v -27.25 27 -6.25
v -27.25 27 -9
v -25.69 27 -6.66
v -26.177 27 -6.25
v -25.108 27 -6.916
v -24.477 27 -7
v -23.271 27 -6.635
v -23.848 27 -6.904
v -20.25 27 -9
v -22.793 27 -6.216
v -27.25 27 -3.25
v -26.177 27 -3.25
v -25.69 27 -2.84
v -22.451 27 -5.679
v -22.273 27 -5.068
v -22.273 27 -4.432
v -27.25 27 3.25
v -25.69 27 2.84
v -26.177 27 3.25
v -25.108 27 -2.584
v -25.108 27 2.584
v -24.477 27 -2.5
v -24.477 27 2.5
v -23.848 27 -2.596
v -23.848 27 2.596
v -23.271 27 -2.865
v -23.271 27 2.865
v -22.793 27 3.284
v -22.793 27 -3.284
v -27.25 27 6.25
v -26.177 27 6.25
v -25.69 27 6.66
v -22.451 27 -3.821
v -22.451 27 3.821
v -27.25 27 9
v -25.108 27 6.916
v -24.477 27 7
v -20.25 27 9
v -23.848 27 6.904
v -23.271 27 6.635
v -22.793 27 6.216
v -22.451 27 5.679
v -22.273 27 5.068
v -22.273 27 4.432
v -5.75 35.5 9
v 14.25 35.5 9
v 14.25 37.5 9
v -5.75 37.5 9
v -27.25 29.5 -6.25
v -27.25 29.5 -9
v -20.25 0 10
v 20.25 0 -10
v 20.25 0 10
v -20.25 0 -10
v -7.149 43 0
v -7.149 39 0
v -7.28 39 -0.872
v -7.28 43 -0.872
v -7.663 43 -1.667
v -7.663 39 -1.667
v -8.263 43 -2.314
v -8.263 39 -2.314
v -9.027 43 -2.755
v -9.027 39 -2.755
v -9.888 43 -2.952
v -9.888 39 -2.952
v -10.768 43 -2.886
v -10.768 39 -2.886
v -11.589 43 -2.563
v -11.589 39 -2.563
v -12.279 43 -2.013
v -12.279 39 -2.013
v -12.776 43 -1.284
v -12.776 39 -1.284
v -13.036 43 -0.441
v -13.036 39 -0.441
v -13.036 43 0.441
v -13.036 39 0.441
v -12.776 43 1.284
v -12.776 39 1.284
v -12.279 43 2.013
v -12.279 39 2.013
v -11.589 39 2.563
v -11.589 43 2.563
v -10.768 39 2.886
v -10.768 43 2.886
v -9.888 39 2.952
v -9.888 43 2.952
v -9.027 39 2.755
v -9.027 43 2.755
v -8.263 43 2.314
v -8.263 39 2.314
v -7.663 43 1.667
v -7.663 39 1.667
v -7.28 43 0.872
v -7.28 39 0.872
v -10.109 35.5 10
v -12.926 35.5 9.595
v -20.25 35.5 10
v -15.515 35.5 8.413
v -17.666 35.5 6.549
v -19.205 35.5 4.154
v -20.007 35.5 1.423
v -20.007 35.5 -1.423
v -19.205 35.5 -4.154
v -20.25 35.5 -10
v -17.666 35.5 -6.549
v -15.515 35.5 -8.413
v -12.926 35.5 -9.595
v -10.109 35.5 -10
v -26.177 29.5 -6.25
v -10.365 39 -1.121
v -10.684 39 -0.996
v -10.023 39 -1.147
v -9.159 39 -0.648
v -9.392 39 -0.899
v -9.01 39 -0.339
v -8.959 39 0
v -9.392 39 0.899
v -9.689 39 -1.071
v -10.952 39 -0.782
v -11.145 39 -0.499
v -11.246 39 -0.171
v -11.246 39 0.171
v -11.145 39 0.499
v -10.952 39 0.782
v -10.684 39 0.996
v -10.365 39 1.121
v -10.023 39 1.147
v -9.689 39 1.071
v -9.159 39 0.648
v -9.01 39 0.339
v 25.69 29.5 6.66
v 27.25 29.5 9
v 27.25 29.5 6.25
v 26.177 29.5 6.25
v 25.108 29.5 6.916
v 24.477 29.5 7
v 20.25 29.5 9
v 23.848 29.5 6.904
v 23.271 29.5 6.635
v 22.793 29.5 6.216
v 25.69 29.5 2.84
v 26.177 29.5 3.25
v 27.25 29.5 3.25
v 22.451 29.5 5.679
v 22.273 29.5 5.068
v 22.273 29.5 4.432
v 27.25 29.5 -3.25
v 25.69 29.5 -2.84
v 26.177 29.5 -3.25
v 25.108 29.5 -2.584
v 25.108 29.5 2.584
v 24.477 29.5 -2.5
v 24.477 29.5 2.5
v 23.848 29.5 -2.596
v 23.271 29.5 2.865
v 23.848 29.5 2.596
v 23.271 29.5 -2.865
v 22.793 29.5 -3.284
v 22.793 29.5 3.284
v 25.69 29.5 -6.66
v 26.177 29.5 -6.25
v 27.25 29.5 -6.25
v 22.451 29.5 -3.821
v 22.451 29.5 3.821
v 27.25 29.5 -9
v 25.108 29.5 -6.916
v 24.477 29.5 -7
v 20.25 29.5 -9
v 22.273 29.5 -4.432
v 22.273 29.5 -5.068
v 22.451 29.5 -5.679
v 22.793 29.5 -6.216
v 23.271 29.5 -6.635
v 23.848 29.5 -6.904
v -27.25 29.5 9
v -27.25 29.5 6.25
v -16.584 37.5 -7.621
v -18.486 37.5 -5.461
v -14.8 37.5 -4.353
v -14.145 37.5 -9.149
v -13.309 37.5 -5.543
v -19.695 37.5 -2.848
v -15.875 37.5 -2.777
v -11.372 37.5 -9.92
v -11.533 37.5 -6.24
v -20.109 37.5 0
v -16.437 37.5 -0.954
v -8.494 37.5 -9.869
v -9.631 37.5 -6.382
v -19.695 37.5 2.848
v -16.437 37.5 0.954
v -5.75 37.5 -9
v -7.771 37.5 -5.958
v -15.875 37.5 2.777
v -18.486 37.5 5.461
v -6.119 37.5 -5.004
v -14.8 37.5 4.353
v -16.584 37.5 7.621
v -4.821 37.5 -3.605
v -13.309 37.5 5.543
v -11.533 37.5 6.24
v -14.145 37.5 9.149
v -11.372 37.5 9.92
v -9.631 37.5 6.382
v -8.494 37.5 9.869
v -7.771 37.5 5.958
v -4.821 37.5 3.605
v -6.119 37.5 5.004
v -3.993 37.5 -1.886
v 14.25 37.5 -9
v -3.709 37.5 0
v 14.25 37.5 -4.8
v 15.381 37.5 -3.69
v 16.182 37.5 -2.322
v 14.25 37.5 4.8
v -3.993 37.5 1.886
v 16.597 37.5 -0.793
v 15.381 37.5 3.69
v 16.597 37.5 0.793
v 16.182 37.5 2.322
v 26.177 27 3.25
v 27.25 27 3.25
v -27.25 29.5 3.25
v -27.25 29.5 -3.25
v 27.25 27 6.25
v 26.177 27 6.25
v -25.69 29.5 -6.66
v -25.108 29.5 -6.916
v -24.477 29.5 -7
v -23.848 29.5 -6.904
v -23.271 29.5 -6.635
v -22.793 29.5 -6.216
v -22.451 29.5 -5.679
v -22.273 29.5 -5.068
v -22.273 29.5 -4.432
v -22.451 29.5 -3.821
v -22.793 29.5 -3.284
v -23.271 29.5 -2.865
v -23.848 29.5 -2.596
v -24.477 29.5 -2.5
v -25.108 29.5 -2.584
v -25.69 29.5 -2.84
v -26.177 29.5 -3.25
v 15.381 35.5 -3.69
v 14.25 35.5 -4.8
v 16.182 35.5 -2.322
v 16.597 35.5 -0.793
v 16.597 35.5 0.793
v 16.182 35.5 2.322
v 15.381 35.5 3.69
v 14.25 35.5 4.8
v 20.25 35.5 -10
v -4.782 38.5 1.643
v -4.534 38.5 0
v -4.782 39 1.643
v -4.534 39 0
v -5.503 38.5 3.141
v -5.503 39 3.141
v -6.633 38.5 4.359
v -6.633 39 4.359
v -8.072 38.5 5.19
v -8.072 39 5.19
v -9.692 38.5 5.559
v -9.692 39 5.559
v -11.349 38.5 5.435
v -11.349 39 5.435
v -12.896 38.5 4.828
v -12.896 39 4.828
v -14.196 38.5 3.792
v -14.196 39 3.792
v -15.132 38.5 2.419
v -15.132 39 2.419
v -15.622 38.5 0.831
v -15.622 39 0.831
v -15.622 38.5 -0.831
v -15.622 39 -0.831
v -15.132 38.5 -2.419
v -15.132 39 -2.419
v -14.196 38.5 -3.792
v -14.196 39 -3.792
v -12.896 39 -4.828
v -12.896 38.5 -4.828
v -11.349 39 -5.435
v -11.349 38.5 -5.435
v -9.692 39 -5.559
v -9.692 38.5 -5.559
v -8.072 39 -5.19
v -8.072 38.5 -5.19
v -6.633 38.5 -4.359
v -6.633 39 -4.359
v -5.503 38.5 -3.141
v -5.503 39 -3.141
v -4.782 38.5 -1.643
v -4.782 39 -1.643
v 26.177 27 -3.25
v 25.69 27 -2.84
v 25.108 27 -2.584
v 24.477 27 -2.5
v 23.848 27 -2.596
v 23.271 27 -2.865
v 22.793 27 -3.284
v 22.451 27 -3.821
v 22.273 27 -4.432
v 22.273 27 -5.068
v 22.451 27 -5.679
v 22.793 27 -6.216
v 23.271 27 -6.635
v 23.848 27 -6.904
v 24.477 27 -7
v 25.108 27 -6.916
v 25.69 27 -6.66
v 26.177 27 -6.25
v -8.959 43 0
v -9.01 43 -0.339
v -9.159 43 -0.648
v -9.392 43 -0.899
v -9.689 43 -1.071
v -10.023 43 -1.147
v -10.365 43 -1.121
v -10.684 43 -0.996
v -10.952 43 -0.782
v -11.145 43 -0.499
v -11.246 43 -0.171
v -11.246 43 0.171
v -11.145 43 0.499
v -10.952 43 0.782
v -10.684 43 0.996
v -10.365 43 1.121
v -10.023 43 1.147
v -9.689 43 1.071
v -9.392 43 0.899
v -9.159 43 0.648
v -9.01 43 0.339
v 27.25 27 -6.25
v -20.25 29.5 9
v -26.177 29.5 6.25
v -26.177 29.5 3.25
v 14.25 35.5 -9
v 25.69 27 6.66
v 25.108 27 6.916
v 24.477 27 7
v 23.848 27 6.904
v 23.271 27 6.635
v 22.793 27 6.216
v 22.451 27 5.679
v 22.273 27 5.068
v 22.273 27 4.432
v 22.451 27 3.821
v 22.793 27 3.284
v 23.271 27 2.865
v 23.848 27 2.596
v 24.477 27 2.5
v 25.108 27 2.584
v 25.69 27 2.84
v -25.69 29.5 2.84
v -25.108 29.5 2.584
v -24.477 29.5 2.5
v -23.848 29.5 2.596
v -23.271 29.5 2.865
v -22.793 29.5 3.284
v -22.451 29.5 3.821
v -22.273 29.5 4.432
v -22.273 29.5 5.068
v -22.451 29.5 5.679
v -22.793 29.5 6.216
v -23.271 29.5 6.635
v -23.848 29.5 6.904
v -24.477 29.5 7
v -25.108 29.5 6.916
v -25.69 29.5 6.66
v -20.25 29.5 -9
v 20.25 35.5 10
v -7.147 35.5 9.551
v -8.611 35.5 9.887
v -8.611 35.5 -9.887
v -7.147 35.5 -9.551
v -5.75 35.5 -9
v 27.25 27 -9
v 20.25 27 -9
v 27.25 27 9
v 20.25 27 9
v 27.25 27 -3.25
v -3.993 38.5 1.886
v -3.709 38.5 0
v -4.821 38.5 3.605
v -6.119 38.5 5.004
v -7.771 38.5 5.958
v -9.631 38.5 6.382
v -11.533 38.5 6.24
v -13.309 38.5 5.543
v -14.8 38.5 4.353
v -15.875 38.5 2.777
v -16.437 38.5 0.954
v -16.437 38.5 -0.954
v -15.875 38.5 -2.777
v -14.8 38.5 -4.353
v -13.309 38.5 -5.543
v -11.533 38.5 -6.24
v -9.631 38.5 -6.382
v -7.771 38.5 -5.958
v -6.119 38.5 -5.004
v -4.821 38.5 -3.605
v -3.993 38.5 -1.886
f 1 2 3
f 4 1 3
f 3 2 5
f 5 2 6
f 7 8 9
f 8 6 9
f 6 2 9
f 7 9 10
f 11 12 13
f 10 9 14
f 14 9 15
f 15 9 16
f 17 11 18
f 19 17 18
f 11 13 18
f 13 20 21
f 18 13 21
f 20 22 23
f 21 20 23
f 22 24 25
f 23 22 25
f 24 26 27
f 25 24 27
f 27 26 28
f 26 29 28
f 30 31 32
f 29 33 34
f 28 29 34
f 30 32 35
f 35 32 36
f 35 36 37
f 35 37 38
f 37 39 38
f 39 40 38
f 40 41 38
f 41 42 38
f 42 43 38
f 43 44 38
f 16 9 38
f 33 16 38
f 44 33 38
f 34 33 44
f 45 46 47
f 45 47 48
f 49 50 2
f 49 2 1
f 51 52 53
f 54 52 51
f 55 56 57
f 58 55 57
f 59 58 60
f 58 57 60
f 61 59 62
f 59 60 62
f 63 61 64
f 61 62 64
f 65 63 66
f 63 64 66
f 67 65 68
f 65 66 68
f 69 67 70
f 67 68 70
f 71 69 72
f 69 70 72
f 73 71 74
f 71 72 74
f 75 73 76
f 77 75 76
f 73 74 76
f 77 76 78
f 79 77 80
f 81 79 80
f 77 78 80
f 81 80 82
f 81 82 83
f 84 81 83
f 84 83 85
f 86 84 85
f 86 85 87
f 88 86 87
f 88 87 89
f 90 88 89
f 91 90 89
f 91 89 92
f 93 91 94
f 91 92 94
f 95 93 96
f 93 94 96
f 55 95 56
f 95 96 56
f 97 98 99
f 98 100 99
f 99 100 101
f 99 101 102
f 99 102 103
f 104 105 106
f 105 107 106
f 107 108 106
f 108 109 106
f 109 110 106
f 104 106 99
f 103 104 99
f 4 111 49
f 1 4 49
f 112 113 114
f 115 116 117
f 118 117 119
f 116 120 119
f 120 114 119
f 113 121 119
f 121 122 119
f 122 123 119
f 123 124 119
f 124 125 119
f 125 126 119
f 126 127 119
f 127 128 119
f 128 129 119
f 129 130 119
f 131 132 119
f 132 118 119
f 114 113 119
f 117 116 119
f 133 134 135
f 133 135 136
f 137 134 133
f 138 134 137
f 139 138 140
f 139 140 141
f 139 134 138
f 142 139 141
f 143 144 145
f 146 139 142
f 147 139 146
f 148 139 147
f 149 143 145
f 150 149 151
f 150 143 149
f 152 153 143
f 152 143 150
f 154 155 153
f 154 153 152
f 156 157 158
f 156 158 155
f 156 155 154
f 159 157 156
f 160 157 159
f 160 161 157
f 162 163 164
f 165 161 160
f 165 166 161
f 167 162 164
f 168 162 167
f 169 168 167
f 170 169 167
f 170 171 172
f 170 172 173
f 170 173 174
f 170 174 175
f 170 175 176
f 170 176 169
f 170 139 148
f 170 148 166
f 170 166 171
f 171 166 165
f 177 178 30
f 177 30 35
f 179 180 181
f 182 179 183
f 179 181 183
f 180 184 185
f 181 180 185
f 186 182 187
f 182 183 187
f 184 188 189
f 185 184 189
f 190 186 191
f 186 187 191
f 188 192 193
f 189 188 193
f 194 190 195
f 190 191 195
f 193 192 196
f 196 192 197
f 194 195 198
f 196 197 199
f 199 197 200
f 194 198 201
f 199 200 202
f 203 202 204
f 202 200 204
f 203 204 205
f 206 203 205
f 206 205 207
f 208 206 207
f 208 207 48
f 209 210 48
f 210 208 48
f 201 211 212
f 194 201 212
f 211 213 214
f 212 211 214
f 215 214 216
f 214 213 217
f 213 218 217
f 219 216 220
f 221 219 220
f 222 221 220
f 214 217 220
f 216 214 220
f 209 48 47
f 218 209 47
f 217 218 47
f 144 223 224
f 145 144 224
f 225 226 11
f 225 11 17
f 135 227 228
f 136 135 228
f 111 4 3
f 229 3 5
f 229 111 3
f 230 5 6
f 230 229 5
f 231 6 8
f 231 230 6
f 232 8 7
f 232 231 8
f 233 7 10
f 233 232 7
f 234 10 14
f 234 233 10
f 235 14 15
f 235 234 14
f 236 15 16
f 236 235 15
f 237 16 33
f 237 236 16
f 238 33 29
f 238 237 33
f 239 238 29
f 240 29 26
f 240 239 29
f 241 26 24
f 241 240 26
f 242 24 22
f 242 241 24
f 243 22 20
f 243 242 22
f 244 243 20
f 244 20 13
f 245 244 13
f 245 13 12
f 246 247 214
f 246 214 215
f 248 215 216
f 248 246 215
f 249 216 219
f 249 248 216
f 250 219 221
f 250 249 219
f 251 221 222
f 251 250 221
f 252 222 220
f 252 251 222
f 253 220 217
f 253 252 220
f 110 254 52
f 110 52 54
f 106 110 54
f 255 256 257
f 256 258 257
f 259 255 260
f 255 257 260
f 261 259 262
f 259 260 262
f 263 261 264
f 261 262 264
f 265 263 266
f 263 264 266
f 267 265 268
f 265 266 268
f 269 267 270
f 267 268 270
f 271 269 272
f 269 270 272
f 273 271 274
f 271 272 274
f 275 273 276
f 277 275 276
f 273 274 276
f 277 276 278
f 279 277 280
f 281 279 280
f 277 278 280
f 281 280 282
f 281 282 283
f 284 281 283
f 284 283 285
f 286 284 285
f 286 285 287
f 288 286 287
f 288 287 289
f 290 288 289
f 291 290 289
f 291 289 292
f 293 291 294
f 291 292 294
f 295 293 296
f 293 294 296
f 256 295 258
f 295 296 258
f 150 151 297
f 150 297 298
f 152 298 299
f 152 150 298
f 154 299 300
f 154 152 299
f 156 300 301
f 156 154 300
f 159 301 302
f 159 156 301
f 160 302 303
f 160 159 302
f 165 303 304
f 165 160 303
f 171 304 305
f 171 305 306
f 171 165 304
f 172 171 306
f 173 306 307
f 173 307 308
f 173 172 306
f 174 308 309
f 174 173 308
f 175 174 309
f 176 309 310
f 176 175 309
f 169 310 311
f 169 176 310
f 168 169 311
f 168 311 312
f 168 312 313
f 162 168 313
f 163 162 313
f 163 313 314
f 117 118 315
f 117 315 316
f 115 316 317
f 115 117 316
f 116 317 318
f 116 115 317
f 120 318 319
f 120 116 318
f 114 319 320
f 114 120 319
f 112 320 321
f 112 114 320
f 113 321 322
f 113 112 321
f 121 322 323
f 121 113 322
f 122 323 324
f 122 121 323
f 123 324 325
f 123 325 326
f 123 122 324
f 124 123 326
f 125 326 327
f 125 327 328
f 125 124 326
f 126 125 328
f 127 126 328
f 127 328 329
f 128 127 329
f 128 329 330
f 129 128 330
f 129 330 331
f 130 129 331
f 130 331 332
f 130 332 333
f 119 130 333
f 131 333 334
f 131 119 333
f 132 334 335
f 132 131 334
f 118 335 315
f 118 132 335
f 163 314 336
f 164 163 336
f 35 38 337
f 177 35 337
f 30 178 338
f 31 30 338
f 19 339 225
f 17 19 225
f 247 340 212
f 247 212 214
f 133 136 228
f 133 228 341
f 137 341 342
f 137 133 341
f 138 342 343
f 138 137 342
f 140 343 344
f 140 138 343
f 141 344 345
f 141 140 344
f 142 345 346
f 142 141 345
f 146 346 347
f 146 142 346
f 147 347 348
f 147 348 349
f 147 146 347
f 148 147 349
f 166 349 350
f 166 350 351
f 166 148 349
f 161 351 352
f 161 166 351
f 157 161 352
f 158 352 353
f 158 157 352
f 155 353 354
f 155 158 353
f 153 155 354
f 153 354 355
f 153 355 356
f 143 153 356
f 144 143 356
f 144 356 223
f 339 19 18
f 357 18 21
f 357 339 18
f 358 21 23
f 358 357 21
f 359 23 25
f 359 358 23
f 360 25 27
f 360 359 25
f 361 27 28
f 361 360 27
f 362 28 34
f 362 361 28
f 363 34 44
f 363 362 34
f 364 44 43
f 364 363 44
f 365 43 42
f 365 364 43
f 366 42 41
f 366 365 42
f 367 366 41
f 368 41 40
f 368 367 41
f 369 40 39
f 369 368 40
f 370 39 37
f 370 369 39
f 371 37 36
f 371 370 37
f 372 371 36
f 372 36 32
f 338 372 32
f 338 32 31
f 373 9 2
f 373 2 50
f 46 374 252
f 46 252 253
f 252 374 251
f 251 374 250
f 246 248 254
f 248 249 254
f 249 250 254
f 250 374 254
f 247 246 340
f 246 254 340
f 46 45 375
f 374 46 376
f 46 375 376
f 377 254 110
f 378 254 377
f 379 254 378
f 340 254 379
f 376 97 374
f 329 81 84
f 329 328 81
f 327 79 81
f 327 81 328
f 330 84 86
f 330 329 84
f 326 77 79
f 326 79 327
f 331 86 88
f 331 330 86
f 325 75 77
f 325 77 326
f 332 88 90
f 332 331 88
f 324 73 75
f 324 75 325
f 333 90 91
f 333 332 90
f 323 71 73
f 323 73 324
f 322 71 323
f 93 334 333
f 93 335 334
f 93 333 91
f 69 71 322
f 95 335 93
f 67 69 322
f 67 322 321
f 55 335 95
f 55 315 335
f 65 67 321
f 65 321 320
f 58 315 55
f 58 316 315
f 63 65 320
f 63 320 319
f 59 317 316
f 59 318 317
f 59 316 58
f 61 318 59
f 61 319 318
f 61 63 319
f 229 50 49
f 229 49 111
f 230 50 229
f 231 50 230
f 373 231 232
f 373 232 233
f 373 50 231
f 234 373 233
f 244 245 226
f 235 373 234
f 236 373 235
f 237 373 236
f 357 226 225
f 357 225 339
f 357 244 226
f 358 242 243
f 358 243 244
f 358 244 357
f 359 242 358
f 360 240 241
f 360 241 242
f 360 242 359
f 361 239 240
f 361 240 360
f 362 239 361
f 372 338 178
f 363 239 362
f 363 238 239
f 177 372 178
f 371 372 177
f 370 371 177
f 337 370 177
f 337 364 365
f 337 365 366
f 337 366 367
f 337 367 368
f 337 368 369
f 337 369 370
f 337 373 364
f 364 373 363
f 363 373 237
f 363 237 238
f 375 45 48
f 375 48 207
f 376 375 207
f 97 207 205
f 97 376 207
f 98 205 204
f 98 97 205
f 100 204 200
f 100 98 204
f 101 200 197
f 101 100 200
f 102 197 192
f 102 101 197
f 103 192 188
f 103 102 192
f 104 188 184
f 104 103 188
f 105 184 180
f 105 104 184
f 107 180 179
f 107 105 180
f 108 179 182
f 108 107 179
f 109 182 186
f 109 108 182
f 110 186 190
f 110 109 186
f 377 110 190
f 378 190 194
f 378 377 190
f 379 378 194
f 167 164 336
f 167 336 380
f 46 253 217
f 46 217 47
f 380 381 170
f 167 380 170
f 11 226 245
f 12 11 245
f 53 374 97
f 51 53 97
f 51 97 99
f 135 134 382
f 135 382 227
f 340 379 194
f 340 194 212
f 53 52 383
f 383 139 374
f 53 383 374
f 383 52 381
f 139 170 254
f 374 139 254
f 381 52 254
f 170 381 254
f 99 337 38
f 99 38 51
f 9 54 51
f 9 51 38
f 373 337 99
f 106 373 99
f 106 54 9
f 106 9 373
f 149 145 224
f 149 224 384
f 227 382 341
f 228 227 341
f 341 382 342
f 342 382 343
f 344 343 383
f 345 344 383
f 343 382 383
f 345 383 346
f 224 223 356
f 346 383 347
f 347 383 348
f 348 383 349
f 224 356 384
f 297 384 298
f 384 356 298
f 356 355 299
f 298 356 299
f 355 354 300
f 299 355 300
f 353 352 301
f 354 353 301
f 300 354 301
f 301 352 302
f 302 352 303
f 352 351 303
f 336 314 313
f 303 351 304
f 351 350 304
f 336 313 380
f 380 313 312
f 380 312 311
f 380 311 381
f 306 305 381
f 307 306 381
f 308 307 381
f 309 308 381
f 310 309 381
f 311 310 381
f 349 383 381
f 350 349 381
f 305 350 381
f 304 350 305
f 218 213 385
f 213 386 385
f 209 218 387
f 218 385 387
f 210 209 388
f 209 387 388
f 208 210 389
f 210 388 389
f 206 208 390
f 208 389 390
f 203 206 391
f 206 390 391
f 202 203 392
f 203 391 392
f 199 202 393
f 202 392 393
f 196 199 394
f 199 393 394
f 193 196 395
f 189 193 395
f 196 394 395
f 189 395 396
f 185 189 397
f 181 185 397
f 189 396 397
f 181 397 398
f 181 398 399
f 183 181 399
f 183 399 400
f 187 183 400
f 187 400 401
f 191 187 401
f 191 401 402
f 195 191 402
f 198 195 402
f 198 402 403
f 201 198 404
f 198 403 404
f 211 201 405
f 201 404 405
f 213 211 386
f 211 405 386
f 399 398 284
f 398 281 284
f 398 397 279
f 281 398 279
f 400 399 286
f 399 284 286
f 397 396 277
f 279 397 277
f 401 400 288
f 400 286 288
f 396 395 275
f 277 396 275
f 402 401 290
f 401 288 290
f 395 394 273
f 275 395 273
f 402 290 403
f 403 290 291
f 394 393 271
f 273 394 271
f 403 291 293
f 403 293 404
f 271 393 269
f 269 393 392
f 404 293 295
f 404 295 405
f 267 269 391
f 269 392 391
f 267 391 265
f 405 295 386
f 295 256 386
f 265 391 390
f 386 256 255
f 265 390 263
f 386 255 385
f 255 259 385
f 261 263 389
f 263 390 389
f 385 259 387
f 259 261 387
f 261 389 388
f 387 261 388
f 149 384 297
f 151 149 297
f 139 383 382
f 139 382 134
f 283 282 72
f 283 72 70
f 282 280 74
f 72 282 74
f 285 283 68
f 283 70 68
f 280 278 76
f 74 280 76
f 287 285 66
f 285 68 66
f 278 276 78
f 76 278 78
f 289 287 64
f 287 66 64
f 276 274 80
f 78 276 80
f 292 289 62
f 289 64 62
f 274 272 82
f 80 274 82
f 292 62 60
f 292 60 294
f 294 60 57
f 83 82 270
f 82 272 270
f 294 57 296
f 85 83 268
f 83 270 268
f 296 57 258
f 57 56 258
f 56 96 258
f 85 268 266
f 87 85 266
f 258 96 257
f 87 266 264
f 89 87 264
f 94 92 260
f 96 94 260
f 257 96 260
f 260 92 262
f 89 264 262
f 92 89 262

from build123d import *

# Parameters (mm, degrees)
ESBO_O1_W                = 40.5
ESBO_O1_H                = 35.5
RESSALTO_EXTRUS_O1_DEPTH = 20
RESSALTO_EXTRUS_O2_DEPTH = 2
ESBO_O3_W                = 18
ESBO_O3_H                = 2.499999999
RESSALTO_EXTRUS_O3_DEPTH = 7
CORTE_EXTRUS_O1_DEPTH    = 11.500000003
CORTE_EXTRUS_O2_DEPTH    = 11.500000003
RESSALTO_EXTRUS_O4_DEPTH = 2
ESBO_O7_W                = 18
ESBO_O7_H                = 2.499999994
RESSALTO_EXTRUS_O5_DEPTH = 7
CORTE_EXTRUS_O3_DEPTH    = 30.499999991
CORTE_EXTRUS_O4_DEPTH    = 30.499999991
ESBO_O10_W               = 2.25
ESBO_O10_H               = 2.5
ESBO_O11_W               = 2.25
ESBO_O11_H               = 2.5
ESBO_O12_W               = 2.25
ESBO_O12_H               = 2.5
ESBO_O13_W               = 2.25
ESBO_O13_H               = 2.5
ESBO_O15_R               = 2.96
ESBO_O15_R_2             = 1.15
RESSALTO_EXTRUS_O6_DEPTH = 4


with BuildPart() as part:
    # Esboço1 → Ressalto-extrusão1 (new body)
    with BuildSketch(Plane(origin=(0, 0, -10), x_dir=(-1, 0, 0), z_dir=(0, 0, -1))):
        with Locations((0, 17.75)):
            Rectangle(ESBO_O1_W, ESBO_O1_H)
    extrude(amount=-RESSALTO_EXTRUS_O1_DEPTH)

    # Esboço2 → Ressalto-extrusão2 (add)
    with BuildSketch(Plane(origin=(0, 35.5, 0), x_dir=(-1, 0, 0), z_dir=(0, 1, 0))):
        with BuildLine():
            Line((-14.25, 9), (5.75, 9))
            ThreePointArc((5.75, 9), (20.108898944, -1e-09), (5.75, -9))
            Line((5.75, -9), (-14.25, -9))
            Line((-14.25, -9), (-14.25, 9))
        make_face()
    extrude(amount=RESSALTO_EXTRUS_O2_DEPTH)

    # Esboço3 → Ressalto-extrusão3 (add)
    with BuildSketch(Plane(origin=(20.25, 0, 0), x_dir=(0, 0, -1), z_dir=(1, 0, 0))):
        with Locations((0, 28.249999997)):
            Rectangle(ESBO_O3_W, ESBO_O3_H)
    extrude(amount=RESSALTO_EXTRUS_O3_DEPTH)

    # Esboço4 → Corte-extrusão1 (cut, through all)
    with BuildSketch(Plane.XZ.offset(-26.999999997)):
        with BuildLine():
            Line((27.25, 3.25), (27.25, 6.25))
            Line((27.25, 6.25), (26.177050983, 6.25))
            ThreePointArc((26.177050983, 6.25), (26.75, 4.75), (26.177050983, 3.25))
            Line((26.177050983, 3.25), (27.25, 3.25))
        make_face()
    extrude(amount=-CORTE_EXTRUS_O1_DEPTH, mode=Mode.SUBTRACT)

    # Esboço5 → Corte-extrusão2 (cut, through all)
    with BuildSketch(Plane.XZ.offset(-26.999999997)):
        with BuildLine():
            Line((27.25, -6.25), (27.25, -3.25))
            Line((27.25, -3.25), (26.177050983, -3.25))
            ThreePointArc((26.177050983, -3.25), (26.75, -4.75), (26.177050983, -6.25))
            Line((26.177050983, -6.25), (27.25, -6.25))
        make_face()
    extrude(amount=-CORTE_EXTRUS_O2_DEPTH, mode=Mode.SUBTRACT)

    # Esboço6 → Ressalto-extrusão4 (add)
    with BuildSketch(Plane(origin=(0, 35.5, 0), x_dir=(-1, 0, 0), z_dir=(0, 1, 0))):
        with BuildLine():
            Line((-14.249999993, 4.8), (-14.249999993, -4.800000003))
            ThreePointArc((-14.249999993, -4.800000003), (-16.649999996, -1e-09), (-14.249999993, 4.8))
        make_face()
    extrude(amount=RESSALTO_EXTRUS_O4_DEPTH)

    # Esboço7 → Ressalto-extrusão5 (add)
    with BuildSketch(Plane.ZY.offset(20.25)):
        with Locations((0, 28.249999994)):
            Rectangle(ESBO_O7_W, ESBO_O7_H)
    extrude(amount=RESSALTO_EXTRUS_O5_DEPTH)

    # Esboço8 → Corte-extrusão3 (cut, through all)
    with BuildSketch(Plane(origin=(0, 29.499999991, 0), x_dir=(-1, 0, 0), z_dir=(0, 1, 0))):
        with BuildLine():
            Line((27.25, 6.25), (26.177050983, 6.25))
            ThreePointArc((26.177050983, 6.25), (26.75, 4.75), (26.177050983, 3.25))
            Line((26.177050983, 3.25), (27.25, 3.25))
            Line((27.25, 3.25), (27.25, 6.25))
        make_face()
    extrude(amount=-CORTE_EXTRUS_O3_DEPTH, mode=Mode.SUBTRACT)

    # Esboço9 → Corte-extrusão4 (cut, through all)
    with BuildSketch(Plane(origin=(0, 29.499999991, 0), x_dir=(-1, 0, 0), z_dir=(0, 1, 0))):
        with BuildLine():
            Line((27.25, -6.25), (27.25, -3.25))
            Line((27.25, -3.25), (26.177050983, -3.25))
            ThreePointArc((26.177050983, -3.25), (26.75, -4.75), (26.177050983, -6.25))
            Line((26.177050983, -6.25), (27.25, -6.25))
        make_face()
    extrude(amount=-CORTE_EXTRUS_O4_DEPTH, mode=Mode.SUBTRACT)

    # Esboço10 → Corte-Revolução1 (revolve, cut)
    with BuildSketch(Plane.XY.offset(4.75)):
        with Locations((-23.375, 28.25)):
            Rectangle(ESBO_O10_W, ESBO_O10_H)
    revolve(axis=Axis((-24.5, 29.5, 4.75), (0, -1, 0)), mode=Mode.SUBTRACT)

    # Esboço11 → Corte-Revolução2 (revolve, cut)
    with BuildSketch(Plane.XY.offset(-4.75)):
        with Locations((-23.375, 28.25)):
            Rectangle(ESBO_O11_W, ESBO_O11_H)
    revolve(axis=Axis((-24.5, 29.5, -4.75), (0, -1, 0)), mode=Mode.SUBTRACT)

    # Esboço12 → Corte-Revolução3 (revolve, cut)
    with BuildSketch(Plane.XY.offset(-4.75)):
        with Locations((25.625, 28.25)):
            Rectangle(ESBO_O12_W, ESBO_O12_H)
    revolve(axis=Axis((24.5, 29.5, -4.75), (0, -1, 0)), mode=Mode.SUBTRACT)

    # Esboço13 → Corte-Revolução4 (revolve, cut)
    with BuildSketch(Plane.XY.offset(4.75)):
        with Locations((25.625, 28.25)):
            Rectangle(ESBO_O13_W, ESBO_O13_H)
    revolve(axis=Axis((24.5, 29.5, 4.75), (0, -1, 0)), mode=Mode.SUBTRACT)

    # Esboço14 → Revolução1 (revolve)
    with BuildSketch(Plane.XY):
        Polygon((-4.533898944, 39), (-10.108898944, 39), (-10.108898944, 37.5), (-3.708898944, 37.5), (-3.708898944, 38.5), (-4.533898944, 38.5), align=None)
    revolve(axis=Axis((-10.108898944, 39, 0), (0, -1, 0)))

    # Esboço15 → Ressalto-extrusão6 (add)
    with BuildSketch(Plane(origin=(0, 39, 0), x_dir=(1, 0, 0), z_dir=(0, 1, 0))):
        with Locations((-10.108898944, 0)):
            Circle(ESBO_O15_R)
        with Locations((-10.108898944, 0)):
            Circle(ESBO_O15_R_2, mode=Mode.SUBTRACT)
    extrude(amount=RESSALTO_EXTRUS_O6_DEPTH)


solid = part.part
